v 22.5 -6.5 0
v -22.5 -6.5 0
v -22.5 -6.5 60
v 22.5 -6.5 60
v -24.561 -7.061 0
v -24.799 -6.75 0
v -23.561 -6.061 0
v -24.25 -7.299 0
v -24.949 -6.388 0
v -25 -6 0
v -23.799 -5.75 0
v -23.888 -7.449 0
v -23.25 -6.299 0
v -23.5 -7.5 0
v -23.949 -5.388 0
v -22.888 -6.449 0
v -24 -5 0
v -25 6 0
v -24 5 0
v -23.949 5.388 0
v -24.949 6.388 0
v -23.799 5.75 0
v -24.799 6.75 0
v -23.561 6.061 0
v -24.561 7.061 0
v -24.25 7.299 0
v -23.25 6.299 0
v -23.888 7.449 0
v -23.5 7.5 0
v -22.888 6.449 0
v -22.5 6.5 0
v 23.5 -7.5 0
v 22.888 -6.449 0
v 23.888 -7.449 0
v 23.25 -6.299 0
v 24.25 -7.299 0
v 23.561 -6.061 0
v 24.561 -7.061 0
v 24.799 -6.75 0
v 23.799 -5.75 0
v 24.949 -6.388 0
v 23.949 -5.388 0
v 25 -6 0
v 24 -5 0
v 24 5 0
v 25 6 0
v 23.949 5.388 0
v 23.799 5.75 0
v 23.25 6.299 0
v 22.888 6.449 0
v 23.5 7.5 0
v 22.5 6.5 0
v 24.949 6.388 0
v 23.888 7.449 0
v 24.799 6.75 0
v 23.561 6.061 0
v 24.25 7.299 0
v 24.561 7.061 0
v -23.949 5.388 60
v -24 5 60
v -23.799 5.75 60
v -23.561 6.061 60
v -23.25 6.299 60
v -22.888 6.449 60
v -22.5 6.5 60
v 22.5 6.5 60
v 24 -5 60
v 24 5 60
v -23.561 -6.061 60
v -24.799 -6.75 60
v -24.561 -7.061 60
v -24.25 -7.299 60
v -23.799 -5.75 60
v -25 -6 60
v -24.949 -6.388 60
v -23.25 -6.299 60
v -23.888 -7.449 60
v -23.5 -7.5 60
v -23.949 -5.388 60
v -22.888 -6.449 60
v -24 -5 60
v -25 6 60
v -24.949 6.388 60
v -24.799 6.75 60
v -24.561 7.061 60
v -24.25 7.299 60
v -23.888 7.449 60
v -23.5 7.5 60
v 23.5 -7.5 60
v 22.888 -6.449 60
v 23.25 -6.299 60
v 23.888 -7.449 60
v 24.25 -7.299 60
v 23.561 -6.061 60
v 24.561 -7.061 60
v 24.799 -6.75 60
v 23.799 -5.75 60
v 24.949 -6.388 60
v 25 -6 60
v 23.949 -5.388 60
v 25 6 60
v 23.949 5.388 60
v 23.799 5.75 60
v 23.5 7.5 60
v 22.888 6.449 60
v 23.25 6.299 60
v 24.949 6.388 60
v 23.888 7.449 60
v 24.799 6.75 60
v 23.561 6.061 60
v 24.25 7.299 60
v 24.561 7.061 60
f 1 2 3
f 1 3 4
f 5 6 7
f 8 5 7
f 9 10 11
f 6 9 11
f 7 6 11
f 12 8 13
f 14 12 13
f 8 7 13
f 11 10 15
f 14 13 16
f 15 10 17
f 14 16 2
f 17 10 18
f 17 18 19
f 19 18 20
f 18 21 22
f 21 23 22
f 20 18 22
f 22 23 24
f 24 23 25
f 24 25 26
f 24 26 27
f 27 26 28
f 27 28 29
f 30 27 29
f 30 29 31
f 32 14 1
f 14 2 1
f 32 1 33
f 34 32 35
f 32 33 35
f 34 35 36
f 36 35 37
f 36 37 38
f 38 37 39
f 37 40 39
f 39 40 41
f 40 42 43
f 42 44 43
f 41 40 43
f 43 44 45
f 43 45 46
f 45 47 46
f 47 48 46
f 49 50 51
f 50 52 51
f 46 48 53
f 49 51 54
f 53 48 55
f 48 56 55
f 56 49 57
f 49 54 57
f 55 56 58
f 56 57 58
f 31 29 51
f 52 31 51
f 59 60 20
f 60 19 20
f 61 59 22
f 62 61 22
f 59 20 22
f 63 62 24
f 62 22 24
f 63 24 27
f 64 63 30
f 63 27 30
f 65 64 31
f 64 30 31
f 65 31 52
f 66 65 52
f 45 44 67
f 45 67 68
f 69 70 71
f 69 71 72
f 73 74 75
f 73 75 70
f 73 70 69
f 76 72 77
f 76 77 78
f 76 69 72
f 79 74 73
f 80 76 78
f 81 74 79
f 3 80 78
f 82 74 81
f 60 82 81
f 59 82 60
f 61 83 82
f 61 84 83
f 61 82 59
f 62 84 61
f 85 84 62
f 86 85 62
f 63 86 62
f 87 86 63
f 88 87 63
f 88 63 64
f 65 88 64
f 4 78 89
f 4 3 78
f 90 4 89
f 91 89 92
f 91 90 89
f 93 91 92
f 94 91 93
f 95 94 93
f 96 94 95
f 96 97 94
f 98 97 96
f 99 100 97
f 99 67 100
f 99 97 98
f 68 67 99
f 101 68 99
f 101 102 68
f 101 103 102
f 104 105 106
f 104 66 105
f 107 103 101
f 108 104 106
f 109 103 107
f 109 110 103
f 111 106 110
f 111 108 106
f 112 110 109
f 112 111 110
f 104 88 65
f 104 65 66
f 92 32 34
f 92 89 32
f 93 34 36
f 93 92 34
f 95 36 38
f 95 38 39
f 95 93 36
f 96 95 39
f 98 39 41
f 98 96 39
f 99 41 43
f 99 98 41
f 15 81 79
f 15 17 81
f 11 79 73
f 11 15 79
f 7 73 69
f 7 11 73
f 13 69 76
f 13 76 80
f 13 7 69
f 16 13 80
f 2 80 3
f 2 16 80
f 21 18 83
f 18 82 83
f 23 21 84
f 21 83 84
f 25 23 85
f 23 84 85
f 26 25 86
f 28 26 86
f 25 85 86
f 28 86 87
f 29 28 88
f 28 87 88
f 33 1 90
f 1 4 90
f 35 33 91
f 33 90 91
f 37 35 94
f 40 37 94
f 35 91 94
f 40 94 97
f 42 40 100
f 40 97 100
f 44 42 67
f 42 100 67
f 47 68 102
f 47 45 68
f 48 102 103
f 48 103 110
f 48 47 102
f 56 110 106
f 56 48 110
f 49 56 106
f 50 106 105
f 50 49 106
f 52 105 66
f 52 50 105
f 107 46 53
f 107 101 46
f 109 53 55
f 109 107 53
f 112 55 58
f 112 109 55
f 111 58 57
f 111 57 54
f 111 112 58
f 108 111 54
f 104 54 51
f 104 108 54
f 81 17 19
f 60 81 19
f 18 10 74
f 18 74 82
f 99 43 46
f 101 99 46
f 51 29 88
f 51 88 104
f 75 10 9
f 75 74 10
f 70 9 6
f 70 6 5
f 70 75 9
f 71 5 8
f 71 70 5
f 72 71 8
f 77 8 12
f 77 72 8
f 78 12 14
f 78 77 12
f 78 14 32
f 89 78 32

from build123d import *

# Parameters (mm, degrees)
F0_W     = 50
F0_H     = 15
F1_DEPTH = 60
F2_T     = -1
F3_R     = 1.5


with BuildPart() as f1:
    # F0 (on Top) → F1 (new body)
    with BuildSketch(Plane.XY):
        Rectangle(F0_W, F0_H)
    extrude(amount=F1_DEPTH)

    # F2
    f2_openings = [f1.faces().sort_by_distance(p)[0] for p in [
        (0, 0, 60),
        (0, 0, 0),
    ]]
    offset(amount=F2_T, openings=f2_openings)

    # F3
    f3_edges = [f1.edges().sort_by_distance(p)[0] for p in [
        (25, 7.5, 30),
        (25, -7.5, 30),
        (-25, 7.5, 30),
        (-25, -7.5, 30),
        (-24, -6.5, 30),
        (24, -6.5, 30),
        (-24, 6.5, 30),
        (24, 6.5, 30),
    ]]
    fillet(f3_edges, radius=F3_R)


solid = f1.part
